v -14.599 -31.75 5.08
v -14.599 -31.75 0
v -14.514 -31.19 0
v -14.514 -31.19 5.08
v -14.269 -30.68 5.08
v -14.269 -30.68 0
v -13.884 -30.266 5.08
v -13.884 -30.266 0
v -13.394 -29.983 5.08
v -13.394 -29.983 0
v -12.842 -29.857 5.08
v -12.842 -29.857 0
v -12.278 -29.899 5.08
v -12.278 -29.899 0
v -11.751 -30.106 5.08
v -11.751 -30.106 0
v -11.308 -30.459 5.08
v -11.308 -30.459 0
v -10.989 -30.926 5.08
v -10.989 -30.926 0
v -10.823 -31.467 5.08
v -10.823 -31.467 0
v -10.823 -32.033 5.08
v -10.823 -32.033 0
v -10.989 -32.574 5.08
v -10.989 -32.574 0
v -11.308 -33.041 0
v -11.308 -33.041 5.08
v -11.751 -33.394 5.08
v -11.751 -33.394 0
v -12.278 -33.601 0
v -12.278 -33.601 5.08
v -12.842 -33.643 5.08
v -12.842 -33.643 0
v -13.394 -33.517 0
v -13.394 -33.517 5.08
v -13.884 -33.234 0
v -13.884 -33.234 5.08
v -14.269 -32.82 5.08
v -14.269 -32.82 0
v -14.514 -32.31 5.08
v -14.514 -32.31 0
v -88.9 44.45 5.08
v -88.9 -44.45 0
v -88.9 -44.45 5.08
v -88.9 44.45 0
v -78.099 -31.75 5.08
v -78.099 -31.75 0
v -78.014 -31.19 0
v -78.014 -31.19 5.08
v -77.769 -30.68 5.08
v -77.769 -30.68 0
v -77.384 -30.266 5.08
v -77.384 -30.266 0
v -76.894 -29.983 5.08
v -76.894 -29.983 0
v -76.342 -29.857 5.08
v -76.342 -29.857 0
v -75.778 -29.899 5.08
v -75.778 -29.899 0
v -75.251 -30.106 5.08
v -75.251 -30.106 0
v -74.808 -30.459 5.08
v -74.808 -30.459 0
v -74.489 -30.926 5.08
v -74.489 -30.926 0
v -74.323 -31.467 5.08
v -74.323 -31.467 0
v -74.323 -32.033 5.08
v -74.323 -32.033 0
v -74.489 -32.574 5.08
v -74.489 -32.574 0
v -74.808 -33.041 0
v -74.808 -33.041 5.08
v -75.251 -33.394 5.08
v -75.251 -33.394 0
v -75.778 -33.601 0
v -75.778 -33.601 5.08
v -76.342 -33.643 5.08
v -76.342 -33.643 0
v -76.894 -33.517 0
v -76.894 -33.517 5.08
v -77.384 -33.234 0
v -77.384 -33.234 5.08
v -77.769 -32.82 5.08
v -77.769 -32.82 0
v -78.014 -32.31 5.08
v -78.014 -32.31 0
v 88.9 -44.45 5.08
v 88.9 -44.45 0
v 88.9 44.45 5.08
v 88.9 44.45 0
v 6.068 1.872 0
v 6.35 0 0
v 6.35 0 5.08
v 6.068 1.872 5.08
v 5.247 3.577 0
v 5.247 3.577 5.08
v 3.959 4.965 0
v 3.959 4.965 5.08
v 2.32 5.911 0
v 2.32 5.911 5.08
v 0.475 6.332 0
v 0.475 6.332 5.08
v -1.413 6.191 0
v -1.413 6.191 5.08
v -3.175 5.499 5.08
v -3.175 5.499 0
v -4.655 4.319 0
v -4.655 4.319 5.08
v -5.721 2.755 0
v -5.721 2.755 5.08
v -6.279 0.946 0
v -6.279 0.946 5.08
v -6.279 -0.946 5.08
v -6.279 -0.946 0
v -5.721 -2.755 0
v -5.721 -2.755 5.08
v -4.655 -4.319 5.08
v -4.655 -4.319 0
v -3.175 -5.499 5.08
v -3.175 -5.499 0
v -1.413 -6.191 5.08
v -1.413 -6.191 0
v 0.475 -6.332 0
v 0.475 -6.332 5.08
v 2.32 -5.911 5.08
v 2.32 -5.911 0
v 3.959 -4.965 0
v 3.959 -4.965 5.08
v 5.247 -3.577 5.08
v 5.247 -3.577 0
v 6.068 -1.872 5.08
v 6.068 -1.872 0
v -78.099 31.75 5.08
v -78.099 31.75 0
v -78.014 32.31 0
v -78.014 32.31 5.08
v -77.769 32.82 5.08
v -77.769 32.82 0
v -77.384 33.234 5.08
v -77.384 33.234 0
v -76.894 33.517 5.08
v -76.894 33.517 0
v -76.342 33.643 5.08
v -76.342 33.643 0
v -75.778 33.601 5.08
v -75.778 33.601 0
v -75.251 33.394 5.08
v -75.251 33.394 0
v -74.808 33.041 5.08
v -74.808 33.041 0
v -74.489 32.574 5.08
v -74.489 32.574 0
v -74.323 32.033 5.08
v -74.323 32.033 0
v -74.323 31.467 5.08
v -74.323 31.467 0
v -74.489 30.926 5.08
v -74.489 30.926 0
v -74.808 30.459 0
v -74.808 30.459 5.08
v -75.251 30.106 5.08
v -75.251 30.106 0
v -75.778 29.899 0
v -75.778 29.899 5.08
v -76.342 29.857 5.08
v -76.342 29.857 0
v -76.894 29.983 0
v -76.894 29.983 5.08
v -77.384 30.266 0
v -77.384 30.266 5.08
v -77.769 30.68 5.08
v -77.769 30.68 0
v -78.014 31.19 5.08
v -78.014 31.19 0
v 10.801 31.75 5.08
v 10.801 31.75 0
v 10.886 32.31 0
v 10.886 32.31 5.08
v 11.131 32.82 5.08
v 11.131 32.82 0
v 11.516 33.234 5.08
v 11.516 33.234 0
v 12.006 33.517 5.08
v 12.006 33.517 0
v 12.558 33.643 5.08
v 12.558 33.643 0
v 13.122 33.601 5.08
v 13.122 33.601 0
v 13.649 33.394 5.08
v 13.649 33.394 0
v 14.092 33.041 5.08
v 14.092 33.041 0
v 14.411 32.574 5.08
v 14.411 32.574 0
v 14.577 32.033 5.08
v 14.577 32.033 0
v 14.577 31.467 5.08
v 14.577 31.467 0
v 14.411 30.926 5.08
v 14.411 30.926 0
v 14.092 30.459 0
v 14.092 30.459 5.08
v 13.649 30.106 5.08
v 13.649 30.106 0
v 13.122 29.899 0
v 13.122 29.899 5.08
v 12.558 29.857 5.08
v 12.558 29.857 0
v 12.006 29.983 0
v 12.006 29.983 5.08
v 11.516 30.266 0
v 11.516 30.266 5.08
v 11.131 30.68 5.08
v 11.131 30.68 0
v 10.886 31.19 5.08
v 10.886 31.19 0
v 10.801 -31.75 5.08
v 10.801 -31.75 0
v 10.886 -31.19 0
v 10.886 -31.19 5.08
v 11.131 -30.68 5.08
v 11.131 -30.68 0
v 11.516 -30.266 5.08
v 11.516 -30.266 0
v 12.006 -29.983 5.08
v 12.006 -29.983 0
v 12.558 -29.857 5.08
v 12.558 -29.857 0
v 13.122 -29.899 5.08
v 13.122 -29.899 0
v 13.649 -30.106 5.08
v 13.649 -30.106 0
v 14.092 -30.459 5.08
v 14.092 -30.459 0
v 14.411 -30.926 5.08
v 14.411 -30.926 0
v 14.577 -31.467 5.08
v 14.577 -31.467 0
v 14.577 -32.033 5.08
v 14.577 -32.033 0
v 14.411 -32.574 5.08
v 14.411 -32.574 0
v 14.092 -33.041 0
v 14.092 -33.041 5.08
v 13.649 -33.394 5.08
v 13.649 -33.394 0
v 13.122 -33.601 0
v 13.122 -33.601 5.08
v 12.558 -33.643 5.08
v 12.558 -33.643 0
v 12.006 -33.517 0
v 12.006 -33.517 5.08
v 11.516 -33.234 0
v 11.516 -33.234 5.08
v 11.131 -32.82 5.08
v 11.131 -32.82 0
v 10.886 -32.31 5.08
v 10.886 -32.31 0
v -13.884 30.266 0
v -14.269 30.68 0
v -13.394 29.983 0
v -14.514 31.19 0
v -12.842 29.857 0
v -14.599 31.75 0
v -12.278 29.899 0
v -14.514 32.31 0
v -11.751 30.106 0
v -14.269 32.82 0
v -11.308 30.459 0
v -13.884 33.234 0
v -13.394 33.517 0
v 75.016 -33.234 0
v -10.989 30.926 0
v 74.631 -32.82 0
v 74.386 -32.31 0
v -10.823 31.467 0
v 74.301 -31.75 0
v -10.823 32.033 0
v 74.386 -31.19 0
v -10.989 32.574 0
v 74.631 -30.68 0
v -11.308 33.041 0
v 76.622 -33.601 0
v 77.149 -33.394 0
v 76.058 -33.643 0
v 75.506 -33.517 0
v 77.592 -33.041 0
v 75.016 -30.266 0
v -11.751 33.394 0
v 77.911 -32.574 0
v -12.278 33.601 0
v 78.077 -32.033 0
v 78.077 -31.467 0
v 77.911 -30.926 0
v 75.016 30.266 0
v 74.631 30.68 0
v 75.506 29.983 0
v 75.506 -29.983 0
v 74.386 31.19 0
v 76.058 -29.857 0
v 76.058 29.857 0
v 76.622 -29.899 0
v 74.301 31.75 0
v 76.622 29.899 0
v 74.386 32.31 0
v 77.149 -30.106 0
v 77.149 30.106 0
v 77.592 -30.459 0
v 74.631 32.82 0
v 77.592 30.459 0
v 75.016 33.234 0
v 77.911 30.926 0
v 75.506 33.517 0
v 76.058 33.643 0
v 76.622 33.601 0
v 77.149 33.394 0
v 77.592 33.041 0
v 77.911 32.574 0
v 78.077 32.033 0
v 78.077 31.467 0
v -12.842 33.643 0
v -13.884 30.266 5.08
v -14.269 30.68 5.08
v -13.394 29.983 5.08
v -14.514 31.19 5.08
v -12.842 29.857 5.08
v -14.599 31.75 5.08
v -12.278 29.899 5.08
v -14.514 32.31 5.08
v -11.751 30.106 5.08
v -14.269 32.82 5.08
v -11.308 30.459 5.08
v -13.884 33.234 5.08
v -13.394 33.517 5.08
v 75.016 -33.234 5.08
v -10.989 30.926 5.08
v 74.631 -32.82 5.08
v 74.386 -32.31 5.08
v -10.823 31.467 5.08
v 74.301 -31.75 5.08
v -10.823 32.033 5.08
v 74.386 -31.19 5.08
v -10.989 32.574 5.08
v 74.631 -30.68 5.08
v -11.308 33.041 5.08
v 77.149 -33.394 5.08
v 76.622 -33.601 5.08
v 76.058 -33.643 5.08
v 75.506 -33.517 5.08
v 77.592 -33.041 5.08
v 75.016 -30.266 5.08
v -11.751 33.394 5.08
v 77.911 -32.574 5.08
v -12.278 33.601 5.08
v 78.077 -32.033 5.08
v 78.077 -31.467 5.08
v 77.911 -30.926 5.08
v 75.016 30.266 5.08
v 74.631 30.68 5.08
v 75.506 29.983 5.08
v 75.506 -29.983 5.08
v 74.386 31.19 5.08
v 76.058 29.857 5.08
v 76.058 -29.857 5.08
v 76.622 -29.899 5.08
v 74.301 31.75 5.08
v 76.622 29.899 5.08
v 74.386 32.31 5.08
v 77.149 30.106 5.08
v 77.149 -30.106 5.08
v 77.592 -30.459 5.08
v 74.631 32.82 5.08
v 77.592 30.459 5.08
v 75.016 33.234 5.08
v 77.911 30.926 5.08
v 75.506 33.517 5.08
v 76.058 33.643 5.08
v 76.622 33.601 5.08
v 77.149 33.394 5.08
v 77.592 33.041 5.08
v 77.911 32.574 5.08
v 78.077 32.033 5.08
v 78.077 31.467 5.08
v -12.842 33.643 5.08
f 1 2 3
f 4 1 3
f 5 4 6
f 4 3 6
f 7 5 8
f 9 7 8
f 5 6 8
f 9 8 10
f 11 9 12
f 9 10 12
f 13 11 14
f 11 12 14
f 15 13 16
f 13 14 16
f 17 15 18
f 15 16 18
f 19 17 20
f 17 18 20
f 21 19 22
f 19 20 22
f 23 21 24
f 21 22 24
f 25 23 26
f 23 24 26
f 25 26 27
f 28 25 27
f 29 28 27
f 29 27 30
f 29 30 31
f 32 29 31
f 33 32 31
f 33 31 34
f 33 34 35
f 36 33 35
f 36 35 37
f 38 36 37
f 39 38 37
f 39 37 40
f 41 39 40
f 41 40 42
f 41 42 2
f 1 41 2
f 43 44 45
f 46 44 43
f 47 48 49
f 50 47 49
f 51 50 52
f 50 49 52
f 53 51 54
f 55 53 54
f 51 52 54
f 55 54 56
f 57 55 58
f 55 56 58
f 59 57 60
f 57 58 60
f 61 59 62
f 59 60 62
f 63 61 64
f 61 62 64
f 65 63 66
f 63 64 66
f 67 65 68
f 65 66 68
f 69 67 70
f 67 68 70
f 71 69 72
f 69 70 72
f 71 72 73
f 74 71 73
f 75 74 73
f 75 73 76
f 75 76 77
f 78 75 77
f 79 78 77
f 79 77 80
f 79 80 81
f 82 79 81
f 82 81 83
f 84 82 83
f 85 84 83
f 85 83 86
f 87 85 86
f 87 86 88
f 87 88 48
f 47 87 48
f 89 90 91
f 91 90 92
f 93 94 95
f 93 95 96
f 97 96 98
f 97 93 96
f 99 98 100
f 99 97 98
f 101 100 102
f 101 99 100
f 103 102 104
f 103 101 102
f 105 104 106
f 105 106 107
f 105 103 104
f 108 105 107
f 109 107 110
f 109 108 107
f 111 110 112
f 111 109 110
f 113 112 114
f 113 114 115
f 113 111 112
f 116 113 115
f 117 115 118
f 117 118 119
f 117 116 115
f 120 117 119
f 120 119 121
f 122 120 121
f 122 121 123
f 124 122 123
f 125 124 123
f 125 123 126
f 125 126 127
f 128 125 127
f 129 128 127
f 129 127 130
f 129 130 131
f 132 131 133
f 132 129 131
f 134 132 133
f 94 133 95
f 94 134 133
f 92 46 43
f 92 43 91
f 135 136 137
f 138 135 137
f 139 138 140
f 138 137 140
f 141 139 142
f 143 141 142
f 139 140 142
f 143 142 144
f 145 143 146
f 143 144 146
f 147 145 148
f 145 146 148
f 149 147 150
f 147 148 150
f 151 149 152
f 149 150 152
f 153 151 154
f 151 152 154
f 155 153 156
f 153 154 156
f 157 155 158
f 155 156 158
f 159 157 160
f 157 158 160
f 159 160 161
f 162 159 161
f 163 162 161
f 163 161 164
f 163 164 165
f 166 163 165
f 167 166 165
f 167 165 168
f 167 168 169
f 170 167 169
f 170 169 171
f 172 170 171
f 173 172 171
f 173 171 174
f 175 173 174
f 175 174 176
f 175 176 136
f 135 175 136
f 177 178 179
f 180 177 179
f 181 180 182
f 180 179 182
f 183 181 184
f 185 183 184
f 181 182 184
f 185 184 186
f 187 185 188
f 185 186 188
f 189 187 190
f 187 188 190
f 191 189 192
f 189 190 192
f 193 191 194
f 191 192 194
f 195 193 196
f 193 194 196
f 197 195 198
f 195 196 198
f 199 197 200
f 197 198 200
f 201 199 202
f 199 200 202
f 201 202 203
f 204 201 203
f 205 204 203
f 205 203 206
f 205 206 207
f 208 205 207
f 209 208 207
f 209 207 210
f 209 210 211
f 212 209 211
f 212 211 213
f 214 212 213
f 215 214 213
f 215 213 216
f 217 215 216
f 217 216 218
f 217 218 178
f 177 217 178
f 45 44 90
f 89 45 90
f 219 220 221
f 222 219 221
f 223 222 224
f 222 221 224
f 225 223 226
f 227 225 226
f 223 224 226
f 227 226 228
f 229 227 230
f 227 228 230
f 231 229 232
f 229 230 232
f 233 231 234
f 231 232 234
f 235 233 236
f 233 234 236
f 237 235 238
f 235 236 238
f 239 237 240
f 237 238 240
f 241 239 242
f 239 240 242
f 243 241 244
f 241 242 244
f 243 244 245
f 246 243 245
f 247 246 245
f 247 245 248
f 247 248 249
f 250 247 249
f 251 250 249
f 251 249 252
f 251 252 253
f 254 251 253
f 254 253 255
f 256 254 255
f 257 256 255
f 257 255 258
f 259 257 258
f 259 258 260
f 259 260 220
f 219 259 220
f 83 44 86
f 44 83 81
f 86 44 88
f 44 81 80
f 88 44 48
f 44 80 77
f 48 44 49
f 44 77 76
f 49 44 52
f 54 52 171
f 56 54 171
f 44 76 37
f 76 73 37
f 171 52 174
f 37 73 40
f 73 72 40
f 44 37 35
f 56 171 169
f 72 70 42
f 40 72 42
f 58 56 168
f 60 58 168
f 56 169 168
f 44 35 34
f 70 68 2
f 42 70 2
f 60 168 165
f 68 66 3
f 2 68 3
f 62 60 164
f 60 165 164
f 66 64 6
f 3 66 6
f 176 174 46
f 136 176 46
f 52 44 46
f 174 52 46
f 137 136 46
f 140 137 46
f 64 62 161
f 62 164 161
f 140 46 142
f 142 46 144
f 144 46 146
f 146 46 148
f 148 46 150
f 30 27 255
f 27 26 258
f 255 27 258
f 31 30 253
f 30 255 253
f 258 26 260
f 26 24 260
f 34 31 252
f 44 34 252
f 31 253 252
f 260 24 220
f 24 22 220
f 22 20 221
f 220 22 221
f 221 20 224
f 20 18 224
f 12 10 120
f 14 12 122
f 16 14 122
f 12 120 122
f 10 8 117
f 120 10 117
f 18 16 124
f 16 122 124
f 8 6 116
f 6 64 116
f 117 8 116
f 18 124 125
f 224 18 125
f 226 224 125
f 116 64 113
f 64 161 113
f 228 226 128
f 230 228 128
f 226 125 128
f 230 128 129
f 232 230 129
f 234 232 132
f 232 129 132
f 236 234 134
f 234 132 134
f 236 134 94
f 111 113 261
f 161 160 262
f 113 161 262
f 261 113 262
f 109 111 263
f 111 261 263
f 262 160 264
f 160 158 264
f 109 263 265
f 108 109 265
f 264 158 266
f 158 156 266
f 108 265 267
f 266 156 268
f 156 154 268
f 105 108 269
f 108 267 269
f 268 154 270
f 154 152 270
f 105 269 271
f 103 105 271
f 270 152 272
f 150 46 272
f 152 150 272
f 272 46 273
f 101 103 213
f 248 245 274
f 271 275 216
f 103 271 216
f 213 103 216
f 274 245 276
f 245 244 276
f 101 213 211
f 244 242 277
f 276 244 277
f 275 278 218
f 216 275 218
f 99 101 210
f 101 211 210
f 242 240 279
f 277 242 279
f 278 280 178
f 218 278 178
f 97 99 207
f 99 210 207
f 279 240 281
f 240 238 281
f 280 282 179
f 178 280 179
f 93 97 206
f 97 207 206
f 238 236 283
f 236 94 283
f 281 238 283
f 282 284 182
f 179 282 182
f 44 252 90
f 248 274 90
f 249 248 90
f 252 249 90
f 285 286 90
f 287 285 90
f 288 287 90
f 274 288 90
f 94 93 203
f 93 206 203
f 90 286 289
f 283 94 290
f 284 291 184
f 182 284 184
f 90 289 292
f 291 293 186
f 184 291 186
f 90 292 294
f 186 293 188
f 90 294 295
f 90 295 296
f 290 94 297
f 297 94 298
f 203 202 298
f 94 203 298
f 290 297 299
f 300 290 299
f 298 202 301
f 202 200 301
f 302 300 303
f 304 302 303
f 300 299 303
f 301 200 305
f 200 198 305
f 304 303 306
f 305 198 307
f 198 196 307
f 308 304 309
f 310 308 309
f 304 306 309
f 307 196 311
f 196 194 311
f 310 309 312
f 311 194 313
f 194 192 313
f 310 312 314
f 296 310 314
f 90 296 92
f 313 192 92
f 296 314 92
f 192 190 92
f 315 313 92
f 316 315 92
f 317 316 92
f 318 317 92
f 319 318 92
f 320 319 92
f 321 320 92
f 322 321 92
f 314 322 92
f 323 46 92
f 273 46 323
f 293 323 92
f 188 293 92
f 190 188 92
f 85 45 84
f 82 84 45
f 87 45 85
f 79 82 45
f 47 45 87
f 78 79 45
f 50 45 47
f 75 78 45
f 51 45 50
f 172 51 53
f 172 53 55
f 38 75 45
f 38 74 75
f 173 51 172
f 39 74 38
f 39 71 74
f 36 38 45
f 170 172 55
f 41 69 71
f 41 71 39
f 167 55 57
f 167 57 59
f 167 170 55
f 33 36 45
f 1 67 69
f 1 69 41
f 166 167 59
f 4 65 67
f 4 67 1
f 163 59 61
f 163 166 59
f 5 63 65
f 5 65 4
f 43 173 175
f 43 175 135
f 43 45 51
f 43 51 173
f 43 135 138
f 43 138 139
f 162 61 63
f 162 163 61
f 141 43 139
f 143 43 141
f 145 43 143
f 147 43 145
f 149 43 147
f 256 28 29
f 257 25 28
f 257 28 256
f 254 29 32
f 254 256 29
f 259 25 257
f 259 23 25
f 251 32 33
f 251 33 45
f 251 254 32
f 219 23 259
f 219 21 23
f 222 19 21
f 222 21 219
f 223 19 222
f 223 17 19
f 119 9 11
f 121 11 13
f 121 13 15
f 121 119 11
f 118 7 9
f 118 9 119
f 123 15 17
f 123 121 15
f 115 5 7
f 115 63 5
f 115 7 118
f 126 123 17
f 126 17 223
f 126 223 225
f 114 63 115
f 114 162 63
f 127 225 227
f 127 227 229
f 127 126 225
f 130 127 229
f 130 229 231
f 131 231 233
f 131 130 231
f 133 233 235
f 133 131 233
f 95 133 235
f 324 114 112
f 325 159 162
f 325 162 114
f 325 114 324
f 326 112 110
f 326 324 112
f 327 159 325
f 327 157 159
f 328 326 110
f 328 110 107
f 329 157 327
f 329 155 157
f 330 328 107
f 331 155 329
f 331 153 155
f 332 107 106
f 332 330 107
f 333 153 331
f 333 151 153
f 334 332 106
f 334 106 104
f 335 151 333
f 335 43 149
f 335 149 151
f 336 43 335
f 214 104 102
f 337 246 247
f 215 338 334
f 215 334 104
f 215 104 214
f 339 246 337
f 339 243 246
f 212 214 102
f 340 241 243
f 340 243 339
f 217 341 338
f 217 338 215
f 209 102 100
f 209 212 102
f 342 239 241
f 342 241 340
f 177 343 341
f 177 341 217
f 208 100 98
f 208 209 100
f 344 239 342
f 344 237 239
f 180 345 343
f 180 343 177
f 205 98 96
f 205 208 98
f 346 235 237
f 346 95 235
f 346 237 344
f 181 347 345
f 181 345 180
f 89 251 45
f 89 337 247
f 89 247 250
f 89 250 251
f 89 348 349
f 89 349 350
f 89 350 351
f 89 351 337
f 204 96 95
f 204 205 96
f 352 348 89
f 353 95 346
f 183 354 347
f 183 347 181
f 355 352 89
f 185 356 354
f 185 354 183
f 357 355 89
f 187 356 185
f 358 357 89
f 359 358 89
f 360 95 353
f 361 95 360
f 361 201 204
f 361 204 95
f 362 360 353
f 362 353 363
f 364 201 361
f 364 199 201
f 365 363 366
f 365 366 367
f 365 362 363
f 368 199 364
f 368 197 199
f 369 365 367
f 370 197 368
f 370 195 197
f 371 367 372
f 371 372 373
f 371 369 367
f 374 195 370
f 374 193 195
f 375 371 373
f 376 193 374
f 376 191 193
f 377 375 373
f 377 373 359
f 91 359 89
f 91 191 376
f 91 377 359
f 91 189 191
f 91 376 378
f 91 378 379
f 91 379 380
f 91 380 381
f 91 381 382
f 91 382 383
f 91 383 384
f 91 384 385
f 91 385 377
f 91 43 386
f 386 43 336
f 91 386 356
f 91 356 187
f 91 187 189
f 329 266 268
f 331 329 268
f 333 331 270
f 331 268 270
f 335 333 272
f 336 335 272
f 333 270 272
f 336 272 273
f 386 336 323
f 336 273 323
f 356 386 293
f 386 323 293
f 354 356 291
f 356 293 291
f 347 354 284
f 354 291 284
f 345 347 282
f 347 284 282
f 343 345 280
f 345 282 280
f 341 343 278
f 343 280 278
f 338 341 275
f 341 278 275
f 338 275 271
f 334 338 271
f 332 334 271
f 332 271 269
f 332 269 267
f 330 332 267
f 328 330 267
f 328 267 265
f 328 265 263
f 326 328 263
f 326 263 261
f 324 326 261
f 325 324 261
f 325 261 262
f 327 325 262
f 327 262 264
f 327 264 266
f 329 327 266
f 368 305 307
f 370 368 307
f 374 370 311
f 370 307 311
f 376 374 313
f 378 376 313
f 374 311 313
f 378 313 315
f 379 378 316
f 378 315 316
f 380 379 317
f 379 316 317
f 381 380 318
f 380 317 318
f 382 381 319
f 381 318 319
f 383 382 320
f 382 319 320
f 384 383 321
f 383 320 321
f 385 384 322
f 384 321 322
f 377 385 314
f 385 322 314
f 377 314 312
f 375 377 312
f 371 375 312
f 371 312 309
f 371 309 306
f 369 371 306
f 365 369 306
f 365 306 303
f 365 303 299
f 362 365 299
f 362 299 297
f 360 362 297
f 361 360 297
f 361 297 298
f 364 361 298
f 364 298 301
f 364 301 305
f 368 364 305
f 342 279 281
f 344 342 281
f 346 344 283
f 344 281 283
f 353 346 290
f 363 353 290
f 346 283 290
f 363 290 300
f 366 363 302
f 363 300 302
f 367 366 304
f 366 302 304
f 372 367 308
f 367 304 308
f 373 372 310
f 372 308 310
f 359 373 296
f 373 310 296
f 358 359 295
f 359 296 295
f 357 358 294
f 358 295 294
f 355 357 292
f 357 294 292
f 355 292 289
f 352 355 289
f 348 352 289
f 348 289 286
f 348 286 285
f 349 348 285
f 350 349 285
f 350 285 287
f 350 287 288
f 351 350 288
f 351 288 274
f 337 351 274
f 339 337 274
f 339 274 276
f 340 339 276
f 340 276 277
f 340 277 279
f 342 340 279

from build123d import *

# Parameters (mm, degrees)
SKETCH1_W             = 177.8
SKETCH1_H             = 88.9
SKETCH1_R             = 6.35
BOSS_EXTRUDE1_DEPTH   = 5.08
F_6_CLEARANCE_HOLE1_D = 3.7973


with BuildPart() as part:
    # Sketch1 → Boss-Extrude1 (new body)
    with BuildSketch(Plane.XY):
        Rectangle(SKETCH1_W, SKETCH1_H)
        Circle(SKETCH1_R, mode=Mode.SUBTRACT)
    extrude(amount=BOSS_EXTRUDE1_DEPTH)

    # #6 Clearance Hole1 (through all)
    with Locations(Plane.XY.offset(5.08)):
        with Locations((76.2, -31.75), (-76.2, 31.75), (-76.2, -31.75), (76.2, 31.75), (12.7, -31.75), (-12.7, 31.75), (-12.7, -31.75), (12.7, 31.75)):
            Hole(F_6_CLEARANCE_HOLE1_D / 2)


solid = part.part
